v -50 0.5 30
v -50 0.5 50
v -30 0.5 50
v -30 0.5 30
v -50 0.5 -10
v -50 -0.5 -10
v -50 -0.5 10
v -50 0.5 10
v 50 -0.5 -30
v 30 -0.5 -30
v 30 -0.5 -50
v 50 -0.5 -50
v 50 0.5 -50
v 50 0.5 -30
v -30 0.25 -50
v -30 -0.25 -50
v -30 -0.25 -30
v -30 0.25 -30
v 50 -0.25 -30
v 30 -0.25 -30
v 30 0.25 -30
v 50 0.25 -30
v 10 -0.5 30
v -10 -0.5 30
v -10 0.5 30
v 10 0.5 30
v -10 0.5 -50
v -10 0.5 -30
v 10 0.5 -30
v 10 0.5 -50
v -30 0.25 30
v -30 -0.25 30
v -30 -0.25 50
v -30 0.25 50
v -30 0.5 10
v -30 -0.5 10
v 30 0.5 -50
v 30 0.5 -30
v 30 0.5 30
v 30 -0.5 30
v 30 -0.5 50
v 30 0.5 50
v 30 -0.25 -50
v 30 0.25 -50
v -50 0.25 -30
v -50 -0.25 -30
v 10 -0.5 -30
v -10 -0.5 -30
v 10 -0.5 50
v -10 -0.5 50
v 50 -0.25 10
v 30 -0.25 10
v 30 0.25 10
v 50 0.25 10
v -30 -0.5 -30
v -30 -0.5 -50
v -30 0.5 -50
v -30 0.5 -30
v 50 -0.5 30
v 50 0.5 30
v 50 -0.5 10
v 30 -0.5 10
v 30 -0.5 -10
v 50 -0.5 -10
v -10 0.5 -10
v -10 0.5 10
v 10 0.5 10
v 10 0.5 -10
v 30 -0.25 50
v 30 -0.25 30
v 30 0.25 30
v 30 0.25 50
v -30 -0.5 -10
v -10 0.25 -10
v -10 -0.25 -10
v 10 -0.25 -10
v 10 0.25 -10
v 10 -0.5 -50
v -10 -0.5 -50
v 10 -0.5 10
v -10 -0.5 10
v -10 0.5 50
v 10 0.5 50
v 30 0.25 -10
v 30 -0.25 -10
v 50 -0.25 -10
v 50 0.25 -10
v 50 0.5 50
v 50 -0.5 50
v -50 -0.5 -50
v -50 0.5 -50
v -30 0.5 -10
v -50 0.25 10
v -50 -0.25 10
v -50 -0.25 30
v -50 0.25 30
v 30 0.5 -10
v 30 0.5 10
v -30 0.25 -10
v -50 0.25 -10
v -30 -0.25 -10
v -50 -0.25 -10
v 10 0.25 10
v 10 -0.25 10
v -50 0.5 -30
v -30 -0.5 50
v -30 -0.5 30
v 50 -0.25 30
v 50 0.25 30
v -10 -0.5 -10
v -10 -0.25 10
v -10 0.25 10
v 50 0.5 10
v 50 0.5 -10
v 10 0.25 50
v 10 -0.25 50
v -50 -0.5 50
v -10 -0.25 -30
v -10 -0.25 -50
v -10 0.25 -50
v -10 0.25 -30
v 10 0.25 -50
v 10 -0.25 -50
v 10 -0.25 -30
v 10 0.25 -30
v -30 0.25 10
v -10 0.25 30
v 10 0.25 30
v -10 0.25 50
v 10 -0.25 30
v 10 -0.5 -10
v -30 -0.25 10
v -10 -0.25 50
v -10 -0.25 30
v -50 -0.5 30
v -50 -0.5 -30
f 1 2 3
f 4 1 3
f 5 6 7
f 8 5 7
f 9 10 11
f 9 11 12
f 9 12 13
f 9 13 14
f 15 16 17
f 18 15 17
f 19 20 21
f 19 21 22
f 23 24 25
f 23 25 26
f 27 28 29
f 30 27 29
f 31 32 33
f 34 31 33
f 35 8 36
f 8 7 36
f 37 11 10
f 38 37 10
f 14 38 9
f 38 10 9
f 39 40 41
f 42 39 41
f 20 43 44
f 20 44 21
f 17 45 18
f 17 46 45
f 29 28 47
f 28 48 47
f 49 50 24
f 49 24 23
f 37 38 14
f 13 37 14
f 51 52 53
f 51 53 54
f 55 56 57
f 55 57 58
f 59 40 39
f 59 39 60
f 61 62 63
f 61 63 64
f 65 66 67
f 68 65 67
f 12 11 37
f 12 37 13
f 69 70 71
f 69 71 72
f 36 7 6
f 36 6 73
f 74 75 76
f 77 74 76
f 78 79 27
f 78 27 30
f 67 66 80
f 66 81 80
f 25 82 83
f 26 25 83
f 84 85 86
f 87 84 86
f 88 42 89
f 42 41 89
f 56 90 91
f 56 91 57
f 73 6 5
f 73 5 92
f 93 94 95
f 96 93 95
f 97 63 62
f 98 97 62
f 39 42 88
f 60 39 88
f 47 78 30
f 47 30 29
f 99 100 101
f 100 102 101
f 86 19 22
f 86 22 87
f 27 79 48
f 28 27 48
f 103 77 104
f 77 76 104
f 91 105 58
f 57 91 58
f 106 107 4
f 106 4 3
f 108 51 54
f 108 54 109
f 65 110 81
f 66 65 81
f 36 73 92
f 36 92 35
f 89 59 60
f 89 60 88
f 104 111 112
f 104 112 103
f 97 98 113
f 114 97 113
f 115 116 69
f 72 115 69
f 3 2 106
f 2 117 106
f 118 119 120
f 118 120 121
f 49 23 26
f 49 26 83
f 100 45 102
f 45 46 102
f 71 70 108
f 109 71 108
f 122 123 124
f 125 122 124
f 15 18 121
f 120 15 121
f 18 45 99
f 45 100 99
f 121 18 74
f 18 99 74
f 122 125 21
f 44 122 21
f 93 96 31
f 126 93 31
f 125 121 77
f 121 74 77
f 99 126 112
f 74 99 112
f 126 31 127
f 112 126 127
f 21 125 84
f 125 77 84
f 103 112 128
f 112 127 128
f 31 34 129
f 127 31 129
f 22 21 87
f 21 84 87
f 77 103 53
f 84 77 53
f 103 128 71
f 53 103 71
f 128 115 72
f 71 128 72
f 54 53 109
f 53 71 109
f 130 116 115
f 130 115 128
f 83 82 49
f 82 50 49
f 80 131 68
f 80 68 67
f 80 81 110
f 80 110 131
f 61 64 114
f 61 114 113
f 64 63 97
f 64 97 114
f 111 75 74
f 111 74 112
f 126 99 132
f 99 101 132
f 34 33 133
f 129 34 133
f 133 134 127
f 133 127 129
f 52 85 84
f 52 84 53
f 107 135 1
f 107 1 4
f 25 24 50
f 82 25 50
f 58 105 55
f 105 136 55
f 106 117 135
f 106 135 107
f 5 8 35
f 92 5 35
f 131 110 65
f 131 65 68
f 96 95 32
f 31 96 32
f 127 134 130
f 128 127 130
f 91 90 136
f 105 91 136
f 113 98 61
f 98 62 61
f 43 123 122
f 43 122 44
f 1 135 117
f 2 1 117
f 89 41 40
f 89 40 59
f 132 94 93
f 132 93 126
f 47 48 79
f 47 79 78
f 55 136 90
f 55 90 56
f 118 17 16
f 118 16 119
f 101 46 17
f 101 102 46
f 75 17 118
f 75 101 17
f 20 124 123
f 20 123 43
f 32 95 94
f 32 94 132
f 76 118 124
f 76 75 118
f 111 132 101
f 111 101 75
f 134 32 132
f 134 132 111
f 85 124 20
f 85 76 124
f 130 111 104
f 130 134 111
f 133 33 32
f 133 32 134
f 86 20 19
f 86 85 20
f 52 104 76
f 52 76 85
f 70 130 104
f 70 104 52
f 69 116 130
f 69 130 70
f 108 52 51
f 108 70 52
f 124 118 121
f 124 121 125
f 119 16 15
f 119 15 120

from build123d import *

# Parameters (mm, degrees)
F0_W     = 20
F0_H     = 20
F1_DEPTH = 0.5
F2_DEPTH = 0.25


with BuildPart() as f1:
    # F0 (on Front) → F1 (new body, symmetric)
    with BuildSketch(Plane.XZ):
        with Locations((-40, 40)):
            Rectangle(F0_W, F0_H)
    extrude(amount=F1_DEPTH, both=True)


with BuildPart() as f1b:
    # F0 (on Front) → F1, piece 2 (new body, symmetric)
    with BuildSketch(Plane.XZ):
        with Locations((0, 40)):
            Rectangle(F0_W, F0_H)
    extrude(amount=F1_DEPTH, both=True)


with BuildPart() as f1c:
    # F0 (on Front) → F1, piece 3 (new body, symmetric)
    with BuildSketch(Plane.XZ):
        with Locations((40, 40)):
            Rectangle(F0_W, F0_H)
    extrude(amount=F1_DEPTH, both=True)


with BuildPart() as f1d:
    # F0 (on Front) → F1, piece 4 (new body, symmetric)
    with BuildSketch(Plane.XZ):
        with Locations((-40, 0)):
            Rectangle(F0_W, F0_H)
    extrude(amount=F1_DEPTH, both=True)


with BuildPart() as f1e:
    # F0 (on Front) → F1, piece 5 (new body, symmetric)
    with BuildSketch(Plane.XZ):
        Rectangle(F0_W, F0_H)
    extrude(amount=F1_DEPTH, both=True)


with BuildPart() as f1f:
    # F0 (on Front) → F1, piece 6 (new body, symmetric)
    with BuildSketch(Plane.XZ):
        with Locations((40, 0)):
            Rectangle(F0_W, F0_H)
    extrude(amount=F1_DEPTH, both=True)


with BuildPart() as f1g:
    # F0 (on Front) → F1, piece 7 (new body, symmetric)
    with BuildSketch(Plane.XZ):
        with Locations((-40, -40)):
            Rectangle(F0_W, F0_H)
    extrude(amount=F1_DEPTH, both=True)


with BuildPart() as f1h:
    # F0 (on Front) → F1, piece 8 (new body, symmetric)
    with BuildSketch(Plane.XZ):
        with Locations((0, -40)):
            Rectangle(F0_W, F0_H)
    extrude(amount=F1_DEPTH, both=True)


with BuildPart() as f1i:
    # F0 (on Front) → F1, piece 9 (new body, symmetric)
    with BuildSketch(Plane.XZ):
        with Locations((40, -40)):
            Rectangle(F0_W, F0_H)
    extrude(amount=F1_DEPTH, both=True)


with BuildPart() as f2:
    # F0 (on Front) → F2 (new body, symmetric)
    with BuildSketch(Plane.XZ):
        with Locations((-20, 40)):
            Rectangle(F0_W, F0_H)
        with Locations((-40, 20)):
            Rectangle(F0_W, F0_H)
        with Locations((-20, 20)):
            Rectangle(F0_W, F0_H)
        with Locations((20, 40)):
            Rectangle(F0_W, F0_H)
        with Locations((20, 20)):
            Rectangle(F0_W, F0_H)
        with Locations((0, 20)):
            Rectangle(F0_W, F0_H)
        with Locations((40, 20)):
            Rectangle(F0_W, F0_H)
        with Locations((20, 0)):
            Rectangle(F0_W, F0_H)
        with Locations((-20, 0)):
            Rectangle(F0_W, F0_H)
        with Locations((-40, -20)):
            Rectangle(F0_W, F0_H)
        with Locations((-20, -20)):
            Rectangle(F0_W, F0_H)
        with Locations((0, -20)):
            Rectangle(F0_W, F0_H)
        with Locations((20, -20)):
            Rectangle(F0_W, F0_H)
        with Locations((40, -20)):
            Rectangle(F0_W, F0_H)
        with Locations((20, -40)):
            Rectangle(F0_W, F0_H)
        with Locations((-20, -40)):
            Rectangle(F0_W, F0_H)
    extrude(amount=F2_DEPTH, both=True)


solid = Compound([f1.part, f1b.part, f1c.part, f1d.part, f1e.part, f1f.part, f1g.part, f1h.part, f1i.part, f2.part])
